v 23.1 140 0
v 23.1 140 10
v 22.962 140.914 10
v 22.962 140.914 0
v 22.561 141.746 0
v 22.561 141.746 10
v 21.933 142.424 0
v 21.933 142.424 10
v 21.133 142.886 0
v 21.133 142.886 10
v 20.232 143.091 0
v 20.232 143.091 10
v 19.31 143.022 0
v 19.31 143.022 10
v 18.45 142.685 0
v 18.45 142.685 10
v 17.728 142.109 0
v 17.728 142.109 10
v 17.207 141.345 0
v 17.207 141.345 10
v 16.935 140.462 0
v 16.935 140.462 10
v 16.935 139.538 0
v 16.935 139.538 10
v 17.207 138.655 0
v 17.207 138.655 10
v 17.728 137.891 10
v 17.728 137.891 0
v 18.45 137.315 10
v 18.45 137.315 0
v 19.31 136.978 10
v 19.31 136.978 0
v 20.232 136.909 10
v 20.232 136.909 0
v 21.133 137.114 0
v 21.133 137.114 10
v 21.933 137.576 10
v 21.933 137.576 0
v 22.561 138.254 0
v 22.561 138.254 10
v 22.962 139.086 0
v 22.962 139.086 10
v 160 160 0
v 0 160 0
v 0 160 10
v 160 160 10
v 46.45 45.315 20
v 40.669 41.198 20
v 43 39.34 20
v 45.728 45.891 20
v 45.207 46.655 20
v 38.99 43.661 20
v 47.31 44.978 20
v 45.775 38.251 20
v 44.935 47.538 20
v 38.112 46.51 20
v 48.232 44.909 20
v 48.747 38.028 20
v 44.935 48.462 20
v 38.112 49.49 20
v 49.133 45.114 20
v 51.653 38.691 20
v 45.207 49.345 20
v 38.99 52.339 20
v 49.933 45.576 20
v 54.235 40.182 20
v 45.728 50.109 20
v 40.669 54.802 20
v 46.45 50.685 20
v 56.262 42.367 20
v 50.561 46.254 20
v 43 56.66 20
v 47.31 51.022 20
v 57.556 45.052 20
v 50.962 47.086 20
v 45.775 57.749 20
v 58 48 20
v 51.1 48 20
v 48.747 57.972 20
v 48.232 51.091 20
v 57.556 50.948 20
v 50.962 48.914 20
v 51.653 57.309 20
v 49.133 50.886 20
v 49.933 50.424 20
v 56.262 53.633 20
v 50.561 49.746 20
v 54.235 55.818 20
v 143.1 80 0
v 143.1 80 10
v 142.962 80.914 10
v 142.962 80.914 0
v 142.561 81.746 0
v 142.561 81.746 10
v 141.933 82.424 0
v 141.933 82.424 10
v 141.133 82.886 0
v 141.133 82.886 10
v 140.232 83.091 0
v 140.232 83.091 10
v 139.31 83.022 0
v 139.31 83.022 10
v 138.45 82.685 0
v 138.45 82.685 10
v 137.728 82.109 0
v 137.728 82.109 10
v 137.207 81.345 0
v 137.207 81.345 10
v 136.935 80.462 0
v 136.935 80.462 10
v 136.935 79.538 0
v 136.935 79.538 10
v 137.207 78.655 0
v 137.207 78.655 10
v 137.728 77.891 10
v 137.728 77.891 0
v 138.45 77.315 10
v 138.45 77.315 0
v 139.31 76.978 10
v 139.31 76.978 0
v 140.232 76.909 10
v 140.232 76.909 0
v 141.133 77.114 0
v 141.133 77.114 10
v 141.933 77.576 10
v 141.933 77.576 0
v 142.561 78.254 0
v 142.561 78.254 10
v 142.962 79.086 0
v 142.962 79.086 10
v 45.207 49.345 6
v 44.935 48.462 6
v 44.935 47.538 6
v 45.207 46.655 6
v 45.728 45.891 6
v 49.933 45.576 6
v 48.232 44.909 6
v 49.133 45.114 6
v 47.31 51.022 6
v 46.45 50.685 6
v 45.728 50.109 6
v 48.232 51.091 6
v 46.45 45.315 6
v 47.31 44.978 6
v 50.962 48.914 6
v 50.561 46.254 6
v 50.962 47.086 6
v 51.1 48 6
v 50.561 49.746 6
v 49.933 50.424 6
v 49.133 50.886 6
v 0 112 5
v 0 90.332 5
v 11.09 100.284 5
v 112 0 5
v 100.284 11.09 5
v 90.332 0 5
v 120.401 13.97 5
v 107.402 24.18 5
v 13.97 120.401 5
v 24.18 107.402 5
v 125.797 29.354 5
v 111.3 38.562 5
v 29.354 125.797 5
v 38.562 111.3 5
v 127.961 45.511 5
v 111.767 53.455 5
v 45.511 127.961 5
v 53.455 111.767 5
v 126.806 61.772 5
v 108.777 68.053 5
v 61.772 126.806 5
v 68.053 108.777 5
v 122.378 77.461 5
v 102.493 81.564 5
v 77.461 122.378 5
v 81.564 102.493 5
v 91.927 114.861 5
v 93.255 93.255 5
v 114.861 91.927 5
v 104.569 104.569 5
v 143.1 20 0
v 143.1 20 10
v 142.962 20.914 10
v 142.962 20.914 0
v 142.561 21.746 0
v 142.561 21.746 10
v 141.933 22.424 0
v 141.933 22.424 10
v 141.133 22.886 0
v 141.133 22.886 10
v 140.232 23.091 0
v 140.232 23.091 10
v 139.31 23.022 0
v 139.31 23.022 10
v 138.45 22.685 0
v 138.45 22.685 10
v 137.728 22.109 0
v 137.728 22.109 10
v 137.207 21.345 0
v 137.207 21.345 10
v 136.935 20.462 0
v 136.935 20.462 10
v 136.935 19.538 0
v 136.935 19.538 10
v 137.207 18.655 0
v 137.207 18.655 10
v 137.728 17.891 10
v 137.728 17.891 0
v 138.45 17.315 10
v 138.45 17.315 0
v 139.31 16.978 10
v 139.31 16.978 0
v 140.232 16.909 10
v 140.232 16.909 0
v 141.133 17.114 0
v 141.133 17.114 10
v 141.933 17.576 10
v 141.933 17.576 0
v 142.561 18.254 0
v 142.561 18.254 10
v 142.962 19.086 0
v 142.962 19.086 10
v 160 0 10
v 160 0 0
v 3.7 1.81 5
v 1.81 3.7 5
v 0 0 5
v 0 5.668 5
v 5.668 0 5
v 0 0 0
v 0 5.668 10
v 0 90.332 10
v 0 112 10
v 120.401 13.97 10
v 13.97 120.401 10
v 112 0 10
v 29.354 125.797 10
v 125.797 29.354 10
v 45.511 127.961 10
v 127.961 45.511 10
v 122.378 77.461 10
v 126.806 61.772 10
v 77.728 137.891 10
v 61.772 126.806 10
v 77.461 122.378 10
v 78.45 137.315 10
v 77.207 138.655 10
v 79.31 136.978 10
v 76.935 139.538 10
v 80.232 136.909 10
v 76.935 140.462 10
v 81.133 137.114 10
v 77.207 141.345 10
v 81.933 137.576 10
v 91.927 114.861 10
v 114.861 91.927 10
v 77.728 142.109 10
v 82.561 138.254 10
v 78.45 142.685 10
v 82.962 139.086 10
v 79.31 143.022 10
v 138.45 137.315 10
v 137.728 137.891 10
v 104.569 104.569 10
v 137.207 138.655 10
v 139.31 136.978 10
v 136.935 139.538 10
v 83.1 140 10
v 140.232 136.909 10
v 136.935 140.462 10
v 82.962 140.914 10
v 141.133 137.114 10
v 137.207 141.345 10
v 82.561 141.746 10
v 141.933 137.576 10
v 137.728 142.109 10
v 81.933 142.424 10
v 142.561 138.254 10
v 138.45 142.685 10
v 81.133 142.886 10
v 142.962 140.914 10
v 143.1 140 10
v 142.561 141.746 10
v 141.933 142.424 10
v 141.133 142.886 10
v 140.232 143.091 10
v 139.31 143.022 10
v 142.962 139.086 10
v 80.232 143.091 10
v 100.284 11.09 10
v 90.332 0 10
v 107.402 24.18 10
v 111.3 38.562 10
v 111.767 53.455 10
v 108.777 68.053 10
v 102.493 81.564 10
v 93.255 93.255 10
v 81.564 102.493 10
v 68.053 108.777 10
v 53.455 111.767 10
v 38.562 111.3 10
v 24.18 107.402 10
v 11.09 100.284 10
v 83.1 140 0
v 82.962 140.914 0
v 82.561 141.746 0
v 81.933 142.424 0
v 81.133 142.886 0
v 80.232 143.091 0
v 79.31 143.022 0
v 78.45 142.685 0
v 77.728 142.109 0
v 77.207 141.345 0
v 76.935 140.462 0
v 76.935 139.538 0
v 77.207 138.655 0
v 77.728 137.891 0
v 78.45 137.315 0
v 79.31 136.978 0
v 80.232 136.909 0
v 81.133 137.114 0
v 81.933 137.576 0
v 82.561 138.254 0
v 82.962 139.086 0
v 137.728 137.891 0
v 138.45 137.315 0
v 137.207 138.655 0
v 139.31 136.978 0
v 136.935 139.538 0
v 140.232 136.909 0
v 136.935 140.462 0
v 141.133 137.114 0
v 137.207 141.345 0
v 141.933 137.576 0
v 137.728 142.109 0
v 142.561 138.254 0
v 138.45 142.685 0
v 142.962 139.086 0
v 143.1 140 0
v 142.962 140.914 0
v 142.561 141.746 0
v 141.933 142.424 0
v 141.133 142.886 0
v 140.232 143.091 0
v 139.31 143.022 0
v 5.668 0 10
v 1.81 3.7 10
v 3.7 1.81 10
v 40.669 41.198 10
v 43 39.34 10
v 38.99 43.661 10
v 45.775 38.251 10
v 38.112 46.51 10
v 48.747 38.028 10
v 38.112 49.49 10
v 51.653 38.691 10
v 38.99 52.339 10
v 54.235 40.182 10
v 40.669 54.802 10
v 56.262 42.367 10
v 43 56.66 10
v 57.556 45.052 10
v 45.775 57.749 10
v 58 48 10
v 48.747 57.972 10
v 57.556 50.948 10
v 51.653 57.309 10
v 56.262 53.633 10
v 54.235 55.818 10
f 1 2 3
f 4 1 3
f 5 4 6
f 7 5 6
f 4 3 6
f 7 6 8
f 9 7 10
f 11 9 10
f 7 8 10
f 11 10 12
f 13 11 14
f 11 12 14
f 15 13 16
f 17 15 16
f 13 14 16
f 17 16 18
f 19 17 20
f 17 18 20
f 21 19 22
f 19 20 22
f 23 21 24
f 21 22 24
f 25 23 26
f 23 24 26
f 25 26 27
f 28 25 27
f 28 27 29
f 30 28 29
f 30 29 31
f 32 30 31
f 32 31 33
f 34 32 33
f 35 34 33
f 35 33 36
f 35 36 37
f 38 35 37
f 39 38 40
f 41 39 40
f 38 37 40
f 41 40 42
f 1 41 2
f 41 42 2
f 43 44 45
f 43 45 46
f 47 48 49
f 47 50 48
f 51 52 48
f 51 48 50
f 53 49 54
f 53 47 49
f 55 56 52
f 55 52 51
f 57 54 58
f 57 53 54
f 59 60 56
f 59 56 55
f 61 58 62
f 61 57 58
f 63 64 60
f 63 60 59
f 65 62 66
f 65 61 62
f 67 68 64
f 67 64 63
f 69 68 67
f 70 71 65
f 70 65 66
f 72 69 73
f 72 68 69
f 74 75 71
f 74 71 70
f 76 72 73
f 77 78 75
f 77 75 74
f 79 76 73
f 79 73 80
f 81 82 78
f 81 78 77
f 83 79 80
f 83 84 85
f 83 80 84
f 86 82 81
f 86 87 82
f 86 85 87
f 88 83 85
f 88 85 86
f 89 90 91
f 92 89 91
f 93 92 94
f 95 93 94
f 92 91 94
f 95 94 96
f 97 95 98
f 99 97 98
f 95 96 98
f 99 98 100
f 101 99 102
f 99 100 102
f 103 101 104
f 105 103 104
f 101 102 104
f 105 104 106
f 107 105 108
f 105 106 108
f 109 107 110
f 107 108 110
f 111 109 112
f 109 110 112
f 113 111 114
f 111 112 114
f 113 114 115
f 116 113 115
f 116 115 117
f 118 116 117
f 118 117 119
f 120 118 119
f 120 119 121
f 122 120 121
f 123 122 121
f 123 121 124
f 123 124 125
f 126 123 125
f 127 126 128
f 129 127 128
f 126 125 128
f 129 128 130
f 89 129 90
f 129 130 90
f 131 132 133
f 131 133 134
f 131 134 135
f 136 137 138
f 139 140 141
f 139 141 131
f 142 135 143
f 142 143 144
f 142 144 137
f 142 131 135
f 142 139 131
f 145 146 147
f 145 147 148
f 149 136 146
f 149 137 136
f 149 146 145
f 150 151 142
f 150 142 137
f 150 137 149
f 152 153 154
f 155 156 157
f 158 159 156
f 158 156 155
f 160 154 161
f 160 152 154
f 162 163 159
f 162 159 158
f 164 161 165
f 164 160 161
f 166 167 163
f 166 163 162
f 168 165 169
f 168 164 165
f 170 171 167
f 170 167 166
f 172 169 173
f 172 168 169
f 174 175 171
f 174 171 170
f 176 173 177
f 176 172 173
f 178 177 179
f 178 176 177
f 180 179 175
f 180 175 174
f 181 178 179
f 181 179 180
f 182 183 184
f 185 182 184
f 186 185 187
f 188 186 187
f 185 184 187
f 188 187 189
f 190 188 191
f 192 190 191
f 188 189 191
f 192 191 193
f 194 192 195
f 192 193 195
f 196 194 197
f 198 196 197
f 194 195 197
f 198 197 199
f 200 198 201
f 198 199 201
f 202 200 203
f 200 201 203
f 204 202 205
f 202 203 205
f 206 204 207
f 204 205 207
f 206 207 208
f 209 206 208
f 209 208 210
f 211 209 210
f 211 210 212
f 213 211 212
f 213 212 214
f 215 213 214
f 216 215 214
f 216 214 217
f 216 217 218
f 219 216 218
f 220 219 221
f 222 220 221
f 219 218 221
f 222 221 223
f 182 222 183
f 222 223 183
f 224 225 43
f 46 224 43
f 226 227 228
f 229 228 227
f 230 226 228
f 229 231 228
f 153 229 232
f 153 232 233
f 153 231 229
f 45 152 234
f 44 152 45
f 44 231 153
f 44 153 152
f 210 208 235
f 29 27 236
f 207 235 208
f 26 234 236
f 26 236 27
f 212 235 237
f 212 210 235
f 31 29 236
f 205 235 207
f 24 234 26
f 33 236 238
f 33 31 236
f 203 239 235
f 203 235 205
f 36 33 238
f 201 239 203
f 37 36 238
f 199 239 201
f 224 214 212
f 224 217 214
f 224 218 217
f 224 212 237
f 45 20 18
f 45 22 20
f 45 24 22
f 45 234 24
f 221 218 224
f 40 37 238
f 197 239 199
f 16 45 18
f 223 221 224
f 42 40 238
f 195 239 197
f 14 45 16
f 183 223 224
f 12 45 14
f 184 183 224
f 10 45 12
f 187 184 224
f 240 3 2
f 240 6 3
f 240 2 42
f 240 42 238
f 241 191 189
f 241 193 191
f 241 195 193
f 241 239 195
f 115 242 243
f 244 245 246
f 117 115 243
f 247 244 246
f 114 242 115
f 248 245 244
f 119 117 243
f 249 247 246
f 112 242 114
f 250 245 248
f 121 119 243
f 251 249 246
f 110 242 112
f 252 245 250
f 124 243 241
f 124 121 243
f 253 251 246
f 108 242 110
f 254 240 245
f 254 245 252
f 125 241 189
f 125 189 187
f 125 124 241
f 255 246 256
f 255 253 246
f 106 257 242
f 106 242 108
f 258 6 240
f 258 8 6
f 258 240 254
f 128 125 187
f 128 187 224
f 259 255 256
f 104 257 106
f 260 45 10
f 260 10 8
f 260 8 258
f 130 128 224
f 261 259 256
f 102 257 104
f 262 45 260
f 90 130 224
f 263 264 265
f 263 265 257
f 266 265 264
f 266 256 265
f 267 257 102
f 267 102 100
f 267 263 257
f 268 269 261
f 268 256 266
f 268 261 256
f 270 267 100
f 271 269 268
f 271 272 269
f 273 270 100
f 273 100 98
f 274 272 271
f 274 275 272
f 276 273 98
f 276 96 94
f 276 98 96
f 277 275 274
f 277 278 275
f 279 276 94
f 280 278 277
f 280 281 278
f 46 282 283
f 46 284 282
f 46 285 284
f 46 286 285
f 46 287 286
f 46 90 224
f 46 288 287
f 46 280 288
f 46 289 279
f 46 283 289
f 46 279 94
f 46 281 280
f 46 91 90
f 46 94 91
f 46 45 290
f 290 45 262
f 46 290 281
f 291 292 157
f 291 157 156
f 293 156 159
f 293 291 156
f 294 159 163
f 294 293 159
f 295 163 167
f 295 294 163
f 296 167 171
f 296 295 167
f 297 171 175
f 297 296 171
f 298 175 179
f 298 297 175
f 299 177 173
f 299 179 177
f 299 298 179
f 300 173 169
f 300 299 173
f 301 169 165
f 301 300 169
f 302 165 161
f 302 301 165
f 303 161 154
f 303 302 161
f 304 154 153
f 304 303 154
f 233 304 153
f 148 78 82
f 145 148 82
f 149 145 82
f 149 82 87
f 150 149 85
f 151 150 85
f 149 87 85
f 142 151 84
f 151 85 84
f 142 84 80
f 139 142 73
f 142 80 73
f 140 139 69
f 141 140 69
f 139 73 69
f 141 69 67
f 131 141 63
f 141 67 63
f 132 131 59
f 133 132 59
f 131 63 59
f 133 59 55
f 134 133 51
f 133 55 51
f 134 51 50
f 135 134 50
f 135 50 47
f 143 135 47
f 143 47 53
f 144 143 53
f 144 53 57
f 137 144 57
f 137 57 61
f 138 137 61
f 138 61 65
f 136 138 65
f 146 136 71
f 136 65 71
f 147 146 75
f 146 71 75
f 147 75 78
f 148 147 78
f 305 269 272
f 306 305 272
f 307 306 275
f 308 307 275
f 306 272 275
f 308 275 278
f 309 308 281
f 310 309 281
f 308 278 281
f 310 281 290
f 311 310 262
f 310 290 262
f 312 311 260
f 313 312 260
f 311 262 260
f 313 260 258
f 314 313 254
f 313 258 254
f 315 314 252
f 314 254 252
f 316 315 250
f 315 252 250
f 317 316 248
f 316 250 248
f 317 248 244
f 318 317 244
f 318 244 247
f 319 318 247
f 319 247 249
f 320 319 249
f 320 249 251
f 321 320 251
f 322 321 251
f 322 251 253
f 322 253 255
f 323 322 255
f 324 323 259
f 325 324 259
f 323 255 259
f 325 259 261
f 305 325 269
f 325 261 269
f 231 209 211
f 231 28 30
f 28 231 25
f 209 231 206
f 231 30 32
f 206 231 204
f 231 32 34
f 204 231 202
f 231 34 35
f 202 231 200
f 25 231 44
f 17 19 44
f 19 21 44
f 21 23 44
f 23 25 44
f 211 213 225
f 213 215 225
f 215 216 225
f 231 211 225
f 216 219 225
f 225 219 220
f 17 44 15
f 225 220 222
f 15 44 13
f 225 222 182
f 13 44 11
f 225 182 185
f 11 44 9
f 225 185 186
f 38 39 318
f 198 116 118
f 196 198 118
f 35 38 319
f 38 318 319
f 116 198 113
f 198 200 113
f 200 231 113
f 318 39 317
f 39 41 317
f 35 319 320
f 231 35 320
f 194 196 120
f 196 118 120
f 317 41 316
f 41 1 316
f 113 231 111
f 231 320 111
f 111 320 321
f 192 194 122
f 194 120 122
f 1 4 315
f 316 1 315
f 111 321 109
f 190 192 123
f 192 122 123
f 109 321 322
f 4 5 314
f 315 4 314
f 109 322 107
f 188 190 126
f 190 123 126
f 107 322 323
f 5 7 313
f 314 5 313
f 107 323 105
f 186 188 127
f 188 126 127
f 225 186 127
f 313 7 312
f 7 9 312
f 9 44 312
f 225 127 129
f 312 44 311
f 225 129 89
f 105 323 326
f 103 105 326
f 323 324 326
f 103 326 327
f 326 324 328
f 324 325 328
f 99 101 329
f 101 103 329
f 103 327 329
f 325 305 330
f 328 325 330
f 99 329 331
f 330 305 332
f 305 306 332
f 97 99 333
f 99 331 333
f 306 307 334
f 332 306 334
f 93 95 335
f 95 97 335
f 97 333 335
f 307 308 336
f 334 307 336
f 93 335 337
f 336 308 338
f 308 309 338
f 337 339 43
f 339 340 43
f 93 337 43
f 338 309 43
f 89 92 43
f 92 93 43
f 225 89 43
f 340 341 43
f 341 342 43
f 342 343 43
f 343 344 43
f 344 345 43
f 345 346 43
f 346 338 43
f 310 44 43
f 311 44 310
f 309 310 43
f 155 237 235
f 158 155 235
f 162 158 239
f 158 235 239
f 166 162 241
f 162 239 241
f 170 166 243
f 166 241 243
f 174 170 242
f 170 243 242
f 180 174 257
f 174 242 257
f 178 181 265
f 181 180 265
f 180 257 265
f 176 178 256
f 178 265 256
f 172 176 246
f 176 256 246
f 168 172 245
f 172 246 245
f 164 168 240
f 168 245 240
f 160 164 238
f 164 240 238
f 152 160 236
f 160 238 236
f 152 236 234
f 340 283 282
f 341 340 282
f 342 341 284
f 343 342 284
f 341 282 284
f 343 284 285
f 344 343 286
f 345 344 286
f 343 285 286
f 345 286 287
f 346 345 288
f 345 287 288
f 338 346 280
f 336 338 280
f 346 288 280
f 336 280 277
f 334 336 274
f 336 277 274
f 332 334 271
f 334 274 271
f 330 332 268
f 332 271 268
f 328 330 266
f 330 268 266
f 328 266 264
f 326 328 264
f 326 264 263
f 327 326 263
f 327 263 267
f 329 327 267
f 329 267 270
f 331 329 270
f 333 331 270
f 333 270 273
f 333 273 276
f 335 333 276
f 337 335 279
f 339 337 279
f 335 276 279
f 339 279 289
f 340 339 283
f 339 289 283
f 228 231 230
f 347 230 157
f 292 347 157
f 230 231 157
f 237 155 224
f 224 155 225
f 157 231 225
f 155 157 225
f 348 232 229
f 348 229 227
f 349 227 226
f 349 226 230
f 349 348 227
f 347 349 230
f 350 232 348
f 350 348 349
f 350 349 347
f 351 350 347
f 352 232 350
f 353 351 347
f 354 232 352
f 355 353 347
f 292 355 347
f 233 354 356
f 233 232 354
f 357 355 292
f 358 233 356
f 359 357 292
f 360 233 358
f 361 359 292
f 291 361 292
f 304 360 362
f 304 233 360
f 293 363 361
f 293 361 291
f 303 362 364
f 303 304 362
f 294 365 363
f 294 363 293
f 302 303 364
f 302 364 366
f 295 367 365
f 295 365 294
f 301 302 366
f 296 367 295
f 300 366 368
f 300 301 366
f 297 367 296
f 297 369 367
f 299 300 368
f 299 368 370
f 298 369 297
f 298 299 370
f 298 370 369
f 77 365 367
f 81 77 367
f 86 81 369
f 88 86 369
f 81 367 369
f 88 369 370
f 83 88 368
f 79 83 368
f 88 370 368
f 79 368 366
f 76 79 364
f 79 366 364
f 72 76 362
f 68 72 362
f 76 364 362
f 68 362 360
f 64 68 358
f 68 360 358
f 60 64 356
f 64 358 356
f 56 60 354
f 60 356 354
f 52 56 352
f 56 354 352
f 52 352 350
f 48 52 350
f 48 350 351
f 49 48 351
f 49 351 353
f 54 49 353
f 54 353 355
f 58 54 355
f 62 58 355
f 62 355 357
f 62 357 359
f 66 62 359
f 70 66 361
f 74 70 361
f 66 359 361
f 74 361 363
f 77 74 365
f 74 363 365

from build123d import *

# Parameters (mm, degrees)
SKETCH_W        = 160
SKETCH_H        = 160
PAD_DEPTH       = 10
SKETCH001_R     = 80
SKETCH001_R_2   = 64
POCKET_DEPTH    = 5
SKETCH002_R     = 3.1
POCKET001_DEPTH = 10
SKETCH003_R     = 10
PAD001_DEPTH    = 10
SKETCH004_R     = 3.1
POCKET002_DEPTH = 14


with BuildPart() as part:
    # Sketch → Pad (new body)
    with BuildSketch(Plane.XY):
        with Locations((80, 80)):
            Rectangle(SKETCH_W, SKETCH_H)
    extrude(amount=PAD_DEPTH)

    # Sketch001 (on Face6 of Pad) → Pocket (cut)
    with BuildSketch(Plane.XY.offset(10)):
        with Locations((48, 48)):
            Circle(SKETCH001_R)
        with Locations((48, 48)):
            Circle(SKETCH001_R_2, mode=Mode.SUBTRACT)
    extrude(amount=-POCKET_DEPTH, mode=Mode.SUBTRACT)

    # Sketch002 (on Face5 of Pocket) → Pocket001 (cut)
    with BuildSketch(Plane.XY.offset(10)):
        with Locations((20, 140)):
            Circle(SKETCH002_R)
        with Locations((80, 140)):
            Circle(SKETCH002_R)
        with Locations((140, 140)):
            Circle(SKETCH002_R)
        with Locations((140, 80)):
            Circle(SKETCH002_R)
        with Locations((140, 20)):
            Circle(SKETCH002_R)
    extrude(amount=-POCKET001_DEPTH, mode=Mode.SUBTRACT)

    # Sketch003 (on Face9 of Pocket001) → Pad001 (join)
    with BuildSketch(Plane.XY.offset(10)):
        with Locations((48, 48)):
            Circle(SKETCH003_R)
    extrude(amount=PAD001_DEPTH)

    # Sketch004 (on Face21 of Pad001) → Pocket002 (cut)
    with BuildSketch(Plane.XY.offset(20)):
        with Locations((48, 48)):
            Circle(SKETCH004_R)
    extrude(amount=-POCKET002_DEPTH, mode=Mode.SUBTRACT)


solid = part.part
